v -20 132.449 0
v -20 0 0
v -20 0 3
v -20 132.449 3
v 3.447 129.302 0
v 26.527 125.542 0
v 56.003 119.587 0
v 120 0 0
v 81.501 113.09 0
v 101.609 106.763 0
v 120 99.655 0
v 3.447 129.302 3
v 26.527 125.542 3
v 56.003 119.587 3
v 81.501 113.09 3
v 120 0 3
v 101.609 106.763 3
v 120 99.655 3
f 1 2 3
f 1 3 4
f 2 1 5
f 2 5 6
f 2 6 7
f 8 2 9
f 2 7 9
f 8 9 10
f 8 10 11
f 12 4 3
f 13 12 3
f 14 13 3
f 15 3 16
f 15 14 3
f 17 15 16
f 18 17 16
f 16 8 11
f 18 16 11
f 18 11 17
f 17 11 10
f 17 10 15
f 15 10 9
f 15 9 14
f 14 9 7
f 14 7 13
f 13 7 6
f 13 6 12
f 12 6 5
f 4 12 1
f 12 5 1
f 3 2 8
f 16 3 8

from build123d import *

# Parameters (mm, degrees)
F1_DEPTH = 3
F2_W     = 900
F2_H     = 300
F2_W_2   = 140
F2_H_2   = 295
F3_DEPTH = 25


with BuildPart() as f1:
    # F0 (on Top) → F1 (new body)
    with BuildSketch(Plane.XY):
        with BuildLine():
            Line((-155, 140), (-155, 0))
            Line((-155, 0), (165, 0))
            Line((165, 0), (165, 70))
            add(Edge.make_bspline(
                [(-155, 140), (-53.2024780843, 141.1128647565), (117.6642985985, 124.1903189238), (165, 70)],
                knots=[0, 0, 0, 0, 0.6796100777, 0.6796100777, 0.6796100777, 0.6796100777], degree=3))
        make_face()
        with BuildLine():
            Line((165, 70), (165, 0))
            Line((165, 0), (185, 0))
            add(Edge.make_bspline(
                [(165, 70), (187.315563281, 44.4529508308), (182.1765787186, 10.6232095777), (185, 0)],
                knots=[0.6796100777, 0.6796100777, 0.6796100777, 0.6796100777, 1, 1, 1, 1], degree=3))
        make_face()
    extrude(amount=F1_DEPTH)


with BuildPart() as f3:
    # F2 (on Top) → F3 (new body)
    with BuildSketch(Plane.XY):
        Rectangle(F2_W, F2_H)
        Rectangle(F2_W_2, F2_H_2, mode=Mode.SUBTRACT)
    extrude(amount=F3_DEPTH)


with BuildPart() as f3_1:
    # F4: moved
    add(f3.part.moved(Location((50, 0, 0))))


with BuildPart() as f1_1:
    add(f1.part)

    # F5: cut F3
    add(f3_1.part, mode=Mode.SUBTRACT)


solid = f1_1.part
